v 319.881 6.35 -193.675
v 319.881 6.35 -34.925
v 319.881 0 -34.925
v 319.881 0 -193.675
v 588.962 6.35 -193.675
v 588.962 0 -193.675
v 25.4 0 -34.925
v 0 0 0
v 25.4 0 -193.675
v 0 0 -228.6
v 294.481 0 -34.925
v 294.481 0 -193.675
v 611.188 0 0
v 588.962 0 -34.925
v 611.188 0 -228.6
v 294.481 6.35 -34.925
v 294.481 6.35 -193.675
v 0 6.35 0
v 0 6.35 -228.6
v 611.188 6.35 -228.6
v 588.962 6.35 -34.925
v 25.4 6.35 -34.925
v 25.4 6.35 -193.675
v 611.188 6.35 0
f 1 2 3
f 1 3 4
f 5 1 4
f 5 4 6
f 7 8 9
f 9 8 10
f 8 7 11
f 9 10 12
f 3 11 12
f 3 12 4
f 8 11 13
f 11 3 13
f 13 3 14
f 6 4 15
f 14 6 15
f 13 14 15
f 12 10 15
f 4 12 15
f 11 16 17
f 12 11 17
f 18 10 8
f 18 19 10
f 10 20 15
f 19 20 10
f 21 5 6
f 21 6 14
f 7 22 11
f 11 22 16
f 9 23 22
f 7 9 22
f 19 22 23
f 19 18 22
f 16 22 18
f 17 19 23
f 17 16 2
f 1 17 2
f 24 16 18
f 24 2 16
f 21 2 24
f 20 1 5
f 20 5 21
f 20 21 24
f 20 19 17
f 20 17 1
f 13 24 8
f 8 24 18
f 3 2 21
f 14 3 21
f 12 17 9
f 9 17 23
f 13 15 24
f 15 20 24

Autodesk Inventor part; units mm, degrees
ref_plane "YZ Plane" through (0, 0, 0) normal (1, 0, 0) x (0, 1, 0)
ref_plane "XZ Plane" through (0, 0, 0) normal (0, 1, 0) x (-1, 0, 0)
ref_plane "XY Plane" through (0, 0, 0) normal (0, 0, 1) x (1, 0, 0)
sketch "Sketch1" plane through (0, 0, 0) normal (0, 1, 0) x (-1, 0, 0)
  line L0 (0, 0) -> (-614.3625, 0)
  line L1 (-614.3625, 0) -> (-614.3625, -228.6)
  line L2 (-614.3625, -228.6) -> (0, -228.6)
  line L3 (0, -228.6) -> (0, 0)
  dimension "d0" = 614.3625
  dimension "d1" = 228.6
extrude "Extrusion1" add sketch "Sketch1" along normal blind 6.35
sketch "Sketch2" plane through (0, 6.35, 0) normal (0, 1, 0) x (1, 0, 0)
  line L0 (0, 228.6) -> (0, 0) projected
  line L1 (0, 0) -> (307.1812, 0)
  line L2 (0, 0) -> (614.3625, 0) projected
  line L3 (307.1812, 0) -> (307.1812, 226.2221)
  line L4 (0, 0) -> (25.4, 0)
  line L5 (25.4, 0) -> (25.4, 25.4)
  line L6 (25.4, 25.4) -> (294.4812, 25.4)
  line L7 (294.4812, 25.4) -> (294.4812, 203.2)
  line L8 (294.4812, 203.2) -> (25.4, 203.2)
  line L9 (25.4, 203.2) -> (25.4, 25.4)
  line L10 (588.9625, 25.4) -> (319.8812, 25.4)
  line L11 (319.8812, 25.4) -> (319.8812, 203.2)
  line L12 (319.8812, 203.2) -> (588.9625, 203.2)
  line L13 (588.9625, 203.2) -> (588.9625, 25.4)
  dimension "d4" = 307.1812
  dimension "d5" = 25.4
  dimension "d6" = 25.4
  dimension "d7" = 269.0813
  dimension "d8" = 177.8
extrude "Extrusion2" cut sketch "Sketch2" against normal blind 117.475
sketch "Sketch3" plane through (0, 6.35, 0) normal (0, 1, 0) x (1, 0, 0)
  line L0 (614.3625, 228.6) -> (0, 228.6) projected
  line L1 (0, 228.6) -> (3.175, 228.6)
  line L2 (3.175, 228.6) -> (3.175, 0)
  line L3 (3.175, 0) -> (0, 0)
  line L4 (0, 0) -> (3.175, 0)
  line L5 (0, 228.6) -> (0, 0) projected
  line L6 (0, 228.6) -> (0, 0)
  dimension "d11" = 3.175
sketch "Sketch4" plane through (0, 6.35, 0) normal (0, 1, 0) x (1, 0, 0)
  line L0 (614.3625, 0) -> (614.3625, 228.6) projected
  line L1 (614.3625, 228.6) -> (611.1875, 228.6)
  line L2 (614.3625, 228.6) -> (0, 228.6) projected
  line L3 (611.1875, 228.6) -> (611.1875, 0)
  line L4 (611.1875, 0) -> (614.3625, 0)
  line L5 (614.3625, 0) -> (611.1875, 0)
  line L6 (614.3625, 228.6) -> (614.3625, 0)
  line L7 (294.4812, 25.4) -> (25.4, 25.4) projected
  line L8 (25.4, 203.2) -> (294.4812, 203.2) projected
  line L9 (294.4812, 203.2) -> (294.4812, 25.4) projected
  line L10 (25.4, 25.4) -> (25.4, 203.2) projected
  line L11 (25.4, 25.4) -> (25.4, 34.925)
  line L12 (25.4, 34.925) -> (294.4812, 34.925)
  line L13 (294.4812, 25.4) -> (294.4812, 34.925)
  line L14 (294.4812, 25.4) -> (25.4, 25.4)
  line L15 (25.4, 203.2) -> (294.4812, 203.2)
  line L16 (294.4812, 203.2) -> (294.4812, 193.675)
  line L17 (294.4812, 193.675) -> (25.4, 193.675)
  line L18 (25.4, 203.2) -> (25.4, 193.675)
  point P0 (0, 0)
  dimension "d12" = 3.175
  dimension "d20" = 177.8
  dimension "d21" = 269.0813
  dimension "d22" = 9.525
  dimension "d23" = 9.525
sketch "Sketch5" plane through (0, 6.35, 0) normal (0, 1, 0) x (1, 0, 0)
  line L0 (614.3625, 228.6) -> (0, 228.6) projected
  line L1 (0, 0) -> (614.3625, 0) projected
  line L2 (0, 228.6) -> (3.175, 228.6)
  line L3 (3.175, 228.6) -> (3.175, 0)
  line L4 (3.175, 0) -> (0, 0)
  line L5 (0, 0) -> (0, 228.6)
  line L6 (614.3625, 228.6) -> (611.1875, 228.6)
  line L7 (611.1875, 228.6) -> (611.1875, 0)
  line L8 (611.1875, 0) -> (614.3625, 0)
  line L9 (614.3625, 0) -> (614.3625, 228.6)
  dimension "d13" = 3.175
  dimension "d14" = 3.175
extrude "Extrusion3" cut sketch "Sketch5" against normal blind 25.4 contours L3 L1 L5 L0
sketch "Sketch6" plane through (0, 6.35, 0) normal (0, 1, 0) x (1, 0, 0)
  line L0 (3.175, 0) -> (614.3625, 0) projected
  line L1 (614.3625, 228.6) -> (611.1875, 228.6)
  line L2 (611.1875, 228.6) -> (611.1875, 0)
  line L3 (611.1875, 0) -> (614.3625, 0)
  line L4 (614.3625, 0) -> (614.3625, 228.6)
  point P0 (0, 0)
  dimension "d17" = 3.175
extrude "Extrusion4" cut sketch "Sketch6" against normal blind 25.4
extrude "Extrusion5" add sketch "Sketch4" against normal blind 6.35 contours L7 L10 L12 L9 | L17 L10 L8 L9
sketch "Sketch7" plane through (0, 6.35, 0) normal (0, 1, 0) x (1, 0, 0)
  line L0 (319.8812, 203.2) -> (319.8812, 25.4) projected
  line L1 (319.8812, 203.2) -> (319.8812, 193.675)
  line L2 (319.8812, 193.675) -> (588.9625, 193.675)
  line L3 (588.9625, 25.4) -> (588.9625, 203.2) projected
  line L4 (588.9625, 203.2) -> (588.9625, 193.675)
  line L5 (588.9625, 203.2) -> (319.8812, 203.2) projected
  line L6 (588.9625, 203.2) -> (319.8812, 203.2)
  line L7 (319.8812, 25.4) -> (588.9625, 25.4) projected
  line L8 (319.8812, 25.4) -> (319.8812, 34.925)
  line L9 (319.8812, 34.925) -> (588.9625, 34.925)
  line L10 (588.9625, 25.4) -> (588.9625, 34.925)
  line L11 (588.9625, 25.4) -> (319.8812, 25.4)
  point P0 (0, 0)
  dimension "d26" = 9.525
  dimension "d27" = 9.525
extrude "Extrusion6" add sketch "Sketch7" against normal blind 6.35 contours L5 L3 L2 L0 | L9 L3 L7 L0
sketch "Sketch8" plane through (0, 6.35, 0) normal (0, 1, 0) x (1, 0, 0)
  line L0 (611.1875, 0) -> (611.1875, 228.6) projected
  line L1 (3.175, 228.6) -> (3.175, 0) projected
  point P0 (0, 0)
  dimension "d30" = 608.0125
extrude "Extrusion7" add sketch "Sketch3" against normal blind 6.35
properties part number "BottomHalfofFront_Ocampo"
